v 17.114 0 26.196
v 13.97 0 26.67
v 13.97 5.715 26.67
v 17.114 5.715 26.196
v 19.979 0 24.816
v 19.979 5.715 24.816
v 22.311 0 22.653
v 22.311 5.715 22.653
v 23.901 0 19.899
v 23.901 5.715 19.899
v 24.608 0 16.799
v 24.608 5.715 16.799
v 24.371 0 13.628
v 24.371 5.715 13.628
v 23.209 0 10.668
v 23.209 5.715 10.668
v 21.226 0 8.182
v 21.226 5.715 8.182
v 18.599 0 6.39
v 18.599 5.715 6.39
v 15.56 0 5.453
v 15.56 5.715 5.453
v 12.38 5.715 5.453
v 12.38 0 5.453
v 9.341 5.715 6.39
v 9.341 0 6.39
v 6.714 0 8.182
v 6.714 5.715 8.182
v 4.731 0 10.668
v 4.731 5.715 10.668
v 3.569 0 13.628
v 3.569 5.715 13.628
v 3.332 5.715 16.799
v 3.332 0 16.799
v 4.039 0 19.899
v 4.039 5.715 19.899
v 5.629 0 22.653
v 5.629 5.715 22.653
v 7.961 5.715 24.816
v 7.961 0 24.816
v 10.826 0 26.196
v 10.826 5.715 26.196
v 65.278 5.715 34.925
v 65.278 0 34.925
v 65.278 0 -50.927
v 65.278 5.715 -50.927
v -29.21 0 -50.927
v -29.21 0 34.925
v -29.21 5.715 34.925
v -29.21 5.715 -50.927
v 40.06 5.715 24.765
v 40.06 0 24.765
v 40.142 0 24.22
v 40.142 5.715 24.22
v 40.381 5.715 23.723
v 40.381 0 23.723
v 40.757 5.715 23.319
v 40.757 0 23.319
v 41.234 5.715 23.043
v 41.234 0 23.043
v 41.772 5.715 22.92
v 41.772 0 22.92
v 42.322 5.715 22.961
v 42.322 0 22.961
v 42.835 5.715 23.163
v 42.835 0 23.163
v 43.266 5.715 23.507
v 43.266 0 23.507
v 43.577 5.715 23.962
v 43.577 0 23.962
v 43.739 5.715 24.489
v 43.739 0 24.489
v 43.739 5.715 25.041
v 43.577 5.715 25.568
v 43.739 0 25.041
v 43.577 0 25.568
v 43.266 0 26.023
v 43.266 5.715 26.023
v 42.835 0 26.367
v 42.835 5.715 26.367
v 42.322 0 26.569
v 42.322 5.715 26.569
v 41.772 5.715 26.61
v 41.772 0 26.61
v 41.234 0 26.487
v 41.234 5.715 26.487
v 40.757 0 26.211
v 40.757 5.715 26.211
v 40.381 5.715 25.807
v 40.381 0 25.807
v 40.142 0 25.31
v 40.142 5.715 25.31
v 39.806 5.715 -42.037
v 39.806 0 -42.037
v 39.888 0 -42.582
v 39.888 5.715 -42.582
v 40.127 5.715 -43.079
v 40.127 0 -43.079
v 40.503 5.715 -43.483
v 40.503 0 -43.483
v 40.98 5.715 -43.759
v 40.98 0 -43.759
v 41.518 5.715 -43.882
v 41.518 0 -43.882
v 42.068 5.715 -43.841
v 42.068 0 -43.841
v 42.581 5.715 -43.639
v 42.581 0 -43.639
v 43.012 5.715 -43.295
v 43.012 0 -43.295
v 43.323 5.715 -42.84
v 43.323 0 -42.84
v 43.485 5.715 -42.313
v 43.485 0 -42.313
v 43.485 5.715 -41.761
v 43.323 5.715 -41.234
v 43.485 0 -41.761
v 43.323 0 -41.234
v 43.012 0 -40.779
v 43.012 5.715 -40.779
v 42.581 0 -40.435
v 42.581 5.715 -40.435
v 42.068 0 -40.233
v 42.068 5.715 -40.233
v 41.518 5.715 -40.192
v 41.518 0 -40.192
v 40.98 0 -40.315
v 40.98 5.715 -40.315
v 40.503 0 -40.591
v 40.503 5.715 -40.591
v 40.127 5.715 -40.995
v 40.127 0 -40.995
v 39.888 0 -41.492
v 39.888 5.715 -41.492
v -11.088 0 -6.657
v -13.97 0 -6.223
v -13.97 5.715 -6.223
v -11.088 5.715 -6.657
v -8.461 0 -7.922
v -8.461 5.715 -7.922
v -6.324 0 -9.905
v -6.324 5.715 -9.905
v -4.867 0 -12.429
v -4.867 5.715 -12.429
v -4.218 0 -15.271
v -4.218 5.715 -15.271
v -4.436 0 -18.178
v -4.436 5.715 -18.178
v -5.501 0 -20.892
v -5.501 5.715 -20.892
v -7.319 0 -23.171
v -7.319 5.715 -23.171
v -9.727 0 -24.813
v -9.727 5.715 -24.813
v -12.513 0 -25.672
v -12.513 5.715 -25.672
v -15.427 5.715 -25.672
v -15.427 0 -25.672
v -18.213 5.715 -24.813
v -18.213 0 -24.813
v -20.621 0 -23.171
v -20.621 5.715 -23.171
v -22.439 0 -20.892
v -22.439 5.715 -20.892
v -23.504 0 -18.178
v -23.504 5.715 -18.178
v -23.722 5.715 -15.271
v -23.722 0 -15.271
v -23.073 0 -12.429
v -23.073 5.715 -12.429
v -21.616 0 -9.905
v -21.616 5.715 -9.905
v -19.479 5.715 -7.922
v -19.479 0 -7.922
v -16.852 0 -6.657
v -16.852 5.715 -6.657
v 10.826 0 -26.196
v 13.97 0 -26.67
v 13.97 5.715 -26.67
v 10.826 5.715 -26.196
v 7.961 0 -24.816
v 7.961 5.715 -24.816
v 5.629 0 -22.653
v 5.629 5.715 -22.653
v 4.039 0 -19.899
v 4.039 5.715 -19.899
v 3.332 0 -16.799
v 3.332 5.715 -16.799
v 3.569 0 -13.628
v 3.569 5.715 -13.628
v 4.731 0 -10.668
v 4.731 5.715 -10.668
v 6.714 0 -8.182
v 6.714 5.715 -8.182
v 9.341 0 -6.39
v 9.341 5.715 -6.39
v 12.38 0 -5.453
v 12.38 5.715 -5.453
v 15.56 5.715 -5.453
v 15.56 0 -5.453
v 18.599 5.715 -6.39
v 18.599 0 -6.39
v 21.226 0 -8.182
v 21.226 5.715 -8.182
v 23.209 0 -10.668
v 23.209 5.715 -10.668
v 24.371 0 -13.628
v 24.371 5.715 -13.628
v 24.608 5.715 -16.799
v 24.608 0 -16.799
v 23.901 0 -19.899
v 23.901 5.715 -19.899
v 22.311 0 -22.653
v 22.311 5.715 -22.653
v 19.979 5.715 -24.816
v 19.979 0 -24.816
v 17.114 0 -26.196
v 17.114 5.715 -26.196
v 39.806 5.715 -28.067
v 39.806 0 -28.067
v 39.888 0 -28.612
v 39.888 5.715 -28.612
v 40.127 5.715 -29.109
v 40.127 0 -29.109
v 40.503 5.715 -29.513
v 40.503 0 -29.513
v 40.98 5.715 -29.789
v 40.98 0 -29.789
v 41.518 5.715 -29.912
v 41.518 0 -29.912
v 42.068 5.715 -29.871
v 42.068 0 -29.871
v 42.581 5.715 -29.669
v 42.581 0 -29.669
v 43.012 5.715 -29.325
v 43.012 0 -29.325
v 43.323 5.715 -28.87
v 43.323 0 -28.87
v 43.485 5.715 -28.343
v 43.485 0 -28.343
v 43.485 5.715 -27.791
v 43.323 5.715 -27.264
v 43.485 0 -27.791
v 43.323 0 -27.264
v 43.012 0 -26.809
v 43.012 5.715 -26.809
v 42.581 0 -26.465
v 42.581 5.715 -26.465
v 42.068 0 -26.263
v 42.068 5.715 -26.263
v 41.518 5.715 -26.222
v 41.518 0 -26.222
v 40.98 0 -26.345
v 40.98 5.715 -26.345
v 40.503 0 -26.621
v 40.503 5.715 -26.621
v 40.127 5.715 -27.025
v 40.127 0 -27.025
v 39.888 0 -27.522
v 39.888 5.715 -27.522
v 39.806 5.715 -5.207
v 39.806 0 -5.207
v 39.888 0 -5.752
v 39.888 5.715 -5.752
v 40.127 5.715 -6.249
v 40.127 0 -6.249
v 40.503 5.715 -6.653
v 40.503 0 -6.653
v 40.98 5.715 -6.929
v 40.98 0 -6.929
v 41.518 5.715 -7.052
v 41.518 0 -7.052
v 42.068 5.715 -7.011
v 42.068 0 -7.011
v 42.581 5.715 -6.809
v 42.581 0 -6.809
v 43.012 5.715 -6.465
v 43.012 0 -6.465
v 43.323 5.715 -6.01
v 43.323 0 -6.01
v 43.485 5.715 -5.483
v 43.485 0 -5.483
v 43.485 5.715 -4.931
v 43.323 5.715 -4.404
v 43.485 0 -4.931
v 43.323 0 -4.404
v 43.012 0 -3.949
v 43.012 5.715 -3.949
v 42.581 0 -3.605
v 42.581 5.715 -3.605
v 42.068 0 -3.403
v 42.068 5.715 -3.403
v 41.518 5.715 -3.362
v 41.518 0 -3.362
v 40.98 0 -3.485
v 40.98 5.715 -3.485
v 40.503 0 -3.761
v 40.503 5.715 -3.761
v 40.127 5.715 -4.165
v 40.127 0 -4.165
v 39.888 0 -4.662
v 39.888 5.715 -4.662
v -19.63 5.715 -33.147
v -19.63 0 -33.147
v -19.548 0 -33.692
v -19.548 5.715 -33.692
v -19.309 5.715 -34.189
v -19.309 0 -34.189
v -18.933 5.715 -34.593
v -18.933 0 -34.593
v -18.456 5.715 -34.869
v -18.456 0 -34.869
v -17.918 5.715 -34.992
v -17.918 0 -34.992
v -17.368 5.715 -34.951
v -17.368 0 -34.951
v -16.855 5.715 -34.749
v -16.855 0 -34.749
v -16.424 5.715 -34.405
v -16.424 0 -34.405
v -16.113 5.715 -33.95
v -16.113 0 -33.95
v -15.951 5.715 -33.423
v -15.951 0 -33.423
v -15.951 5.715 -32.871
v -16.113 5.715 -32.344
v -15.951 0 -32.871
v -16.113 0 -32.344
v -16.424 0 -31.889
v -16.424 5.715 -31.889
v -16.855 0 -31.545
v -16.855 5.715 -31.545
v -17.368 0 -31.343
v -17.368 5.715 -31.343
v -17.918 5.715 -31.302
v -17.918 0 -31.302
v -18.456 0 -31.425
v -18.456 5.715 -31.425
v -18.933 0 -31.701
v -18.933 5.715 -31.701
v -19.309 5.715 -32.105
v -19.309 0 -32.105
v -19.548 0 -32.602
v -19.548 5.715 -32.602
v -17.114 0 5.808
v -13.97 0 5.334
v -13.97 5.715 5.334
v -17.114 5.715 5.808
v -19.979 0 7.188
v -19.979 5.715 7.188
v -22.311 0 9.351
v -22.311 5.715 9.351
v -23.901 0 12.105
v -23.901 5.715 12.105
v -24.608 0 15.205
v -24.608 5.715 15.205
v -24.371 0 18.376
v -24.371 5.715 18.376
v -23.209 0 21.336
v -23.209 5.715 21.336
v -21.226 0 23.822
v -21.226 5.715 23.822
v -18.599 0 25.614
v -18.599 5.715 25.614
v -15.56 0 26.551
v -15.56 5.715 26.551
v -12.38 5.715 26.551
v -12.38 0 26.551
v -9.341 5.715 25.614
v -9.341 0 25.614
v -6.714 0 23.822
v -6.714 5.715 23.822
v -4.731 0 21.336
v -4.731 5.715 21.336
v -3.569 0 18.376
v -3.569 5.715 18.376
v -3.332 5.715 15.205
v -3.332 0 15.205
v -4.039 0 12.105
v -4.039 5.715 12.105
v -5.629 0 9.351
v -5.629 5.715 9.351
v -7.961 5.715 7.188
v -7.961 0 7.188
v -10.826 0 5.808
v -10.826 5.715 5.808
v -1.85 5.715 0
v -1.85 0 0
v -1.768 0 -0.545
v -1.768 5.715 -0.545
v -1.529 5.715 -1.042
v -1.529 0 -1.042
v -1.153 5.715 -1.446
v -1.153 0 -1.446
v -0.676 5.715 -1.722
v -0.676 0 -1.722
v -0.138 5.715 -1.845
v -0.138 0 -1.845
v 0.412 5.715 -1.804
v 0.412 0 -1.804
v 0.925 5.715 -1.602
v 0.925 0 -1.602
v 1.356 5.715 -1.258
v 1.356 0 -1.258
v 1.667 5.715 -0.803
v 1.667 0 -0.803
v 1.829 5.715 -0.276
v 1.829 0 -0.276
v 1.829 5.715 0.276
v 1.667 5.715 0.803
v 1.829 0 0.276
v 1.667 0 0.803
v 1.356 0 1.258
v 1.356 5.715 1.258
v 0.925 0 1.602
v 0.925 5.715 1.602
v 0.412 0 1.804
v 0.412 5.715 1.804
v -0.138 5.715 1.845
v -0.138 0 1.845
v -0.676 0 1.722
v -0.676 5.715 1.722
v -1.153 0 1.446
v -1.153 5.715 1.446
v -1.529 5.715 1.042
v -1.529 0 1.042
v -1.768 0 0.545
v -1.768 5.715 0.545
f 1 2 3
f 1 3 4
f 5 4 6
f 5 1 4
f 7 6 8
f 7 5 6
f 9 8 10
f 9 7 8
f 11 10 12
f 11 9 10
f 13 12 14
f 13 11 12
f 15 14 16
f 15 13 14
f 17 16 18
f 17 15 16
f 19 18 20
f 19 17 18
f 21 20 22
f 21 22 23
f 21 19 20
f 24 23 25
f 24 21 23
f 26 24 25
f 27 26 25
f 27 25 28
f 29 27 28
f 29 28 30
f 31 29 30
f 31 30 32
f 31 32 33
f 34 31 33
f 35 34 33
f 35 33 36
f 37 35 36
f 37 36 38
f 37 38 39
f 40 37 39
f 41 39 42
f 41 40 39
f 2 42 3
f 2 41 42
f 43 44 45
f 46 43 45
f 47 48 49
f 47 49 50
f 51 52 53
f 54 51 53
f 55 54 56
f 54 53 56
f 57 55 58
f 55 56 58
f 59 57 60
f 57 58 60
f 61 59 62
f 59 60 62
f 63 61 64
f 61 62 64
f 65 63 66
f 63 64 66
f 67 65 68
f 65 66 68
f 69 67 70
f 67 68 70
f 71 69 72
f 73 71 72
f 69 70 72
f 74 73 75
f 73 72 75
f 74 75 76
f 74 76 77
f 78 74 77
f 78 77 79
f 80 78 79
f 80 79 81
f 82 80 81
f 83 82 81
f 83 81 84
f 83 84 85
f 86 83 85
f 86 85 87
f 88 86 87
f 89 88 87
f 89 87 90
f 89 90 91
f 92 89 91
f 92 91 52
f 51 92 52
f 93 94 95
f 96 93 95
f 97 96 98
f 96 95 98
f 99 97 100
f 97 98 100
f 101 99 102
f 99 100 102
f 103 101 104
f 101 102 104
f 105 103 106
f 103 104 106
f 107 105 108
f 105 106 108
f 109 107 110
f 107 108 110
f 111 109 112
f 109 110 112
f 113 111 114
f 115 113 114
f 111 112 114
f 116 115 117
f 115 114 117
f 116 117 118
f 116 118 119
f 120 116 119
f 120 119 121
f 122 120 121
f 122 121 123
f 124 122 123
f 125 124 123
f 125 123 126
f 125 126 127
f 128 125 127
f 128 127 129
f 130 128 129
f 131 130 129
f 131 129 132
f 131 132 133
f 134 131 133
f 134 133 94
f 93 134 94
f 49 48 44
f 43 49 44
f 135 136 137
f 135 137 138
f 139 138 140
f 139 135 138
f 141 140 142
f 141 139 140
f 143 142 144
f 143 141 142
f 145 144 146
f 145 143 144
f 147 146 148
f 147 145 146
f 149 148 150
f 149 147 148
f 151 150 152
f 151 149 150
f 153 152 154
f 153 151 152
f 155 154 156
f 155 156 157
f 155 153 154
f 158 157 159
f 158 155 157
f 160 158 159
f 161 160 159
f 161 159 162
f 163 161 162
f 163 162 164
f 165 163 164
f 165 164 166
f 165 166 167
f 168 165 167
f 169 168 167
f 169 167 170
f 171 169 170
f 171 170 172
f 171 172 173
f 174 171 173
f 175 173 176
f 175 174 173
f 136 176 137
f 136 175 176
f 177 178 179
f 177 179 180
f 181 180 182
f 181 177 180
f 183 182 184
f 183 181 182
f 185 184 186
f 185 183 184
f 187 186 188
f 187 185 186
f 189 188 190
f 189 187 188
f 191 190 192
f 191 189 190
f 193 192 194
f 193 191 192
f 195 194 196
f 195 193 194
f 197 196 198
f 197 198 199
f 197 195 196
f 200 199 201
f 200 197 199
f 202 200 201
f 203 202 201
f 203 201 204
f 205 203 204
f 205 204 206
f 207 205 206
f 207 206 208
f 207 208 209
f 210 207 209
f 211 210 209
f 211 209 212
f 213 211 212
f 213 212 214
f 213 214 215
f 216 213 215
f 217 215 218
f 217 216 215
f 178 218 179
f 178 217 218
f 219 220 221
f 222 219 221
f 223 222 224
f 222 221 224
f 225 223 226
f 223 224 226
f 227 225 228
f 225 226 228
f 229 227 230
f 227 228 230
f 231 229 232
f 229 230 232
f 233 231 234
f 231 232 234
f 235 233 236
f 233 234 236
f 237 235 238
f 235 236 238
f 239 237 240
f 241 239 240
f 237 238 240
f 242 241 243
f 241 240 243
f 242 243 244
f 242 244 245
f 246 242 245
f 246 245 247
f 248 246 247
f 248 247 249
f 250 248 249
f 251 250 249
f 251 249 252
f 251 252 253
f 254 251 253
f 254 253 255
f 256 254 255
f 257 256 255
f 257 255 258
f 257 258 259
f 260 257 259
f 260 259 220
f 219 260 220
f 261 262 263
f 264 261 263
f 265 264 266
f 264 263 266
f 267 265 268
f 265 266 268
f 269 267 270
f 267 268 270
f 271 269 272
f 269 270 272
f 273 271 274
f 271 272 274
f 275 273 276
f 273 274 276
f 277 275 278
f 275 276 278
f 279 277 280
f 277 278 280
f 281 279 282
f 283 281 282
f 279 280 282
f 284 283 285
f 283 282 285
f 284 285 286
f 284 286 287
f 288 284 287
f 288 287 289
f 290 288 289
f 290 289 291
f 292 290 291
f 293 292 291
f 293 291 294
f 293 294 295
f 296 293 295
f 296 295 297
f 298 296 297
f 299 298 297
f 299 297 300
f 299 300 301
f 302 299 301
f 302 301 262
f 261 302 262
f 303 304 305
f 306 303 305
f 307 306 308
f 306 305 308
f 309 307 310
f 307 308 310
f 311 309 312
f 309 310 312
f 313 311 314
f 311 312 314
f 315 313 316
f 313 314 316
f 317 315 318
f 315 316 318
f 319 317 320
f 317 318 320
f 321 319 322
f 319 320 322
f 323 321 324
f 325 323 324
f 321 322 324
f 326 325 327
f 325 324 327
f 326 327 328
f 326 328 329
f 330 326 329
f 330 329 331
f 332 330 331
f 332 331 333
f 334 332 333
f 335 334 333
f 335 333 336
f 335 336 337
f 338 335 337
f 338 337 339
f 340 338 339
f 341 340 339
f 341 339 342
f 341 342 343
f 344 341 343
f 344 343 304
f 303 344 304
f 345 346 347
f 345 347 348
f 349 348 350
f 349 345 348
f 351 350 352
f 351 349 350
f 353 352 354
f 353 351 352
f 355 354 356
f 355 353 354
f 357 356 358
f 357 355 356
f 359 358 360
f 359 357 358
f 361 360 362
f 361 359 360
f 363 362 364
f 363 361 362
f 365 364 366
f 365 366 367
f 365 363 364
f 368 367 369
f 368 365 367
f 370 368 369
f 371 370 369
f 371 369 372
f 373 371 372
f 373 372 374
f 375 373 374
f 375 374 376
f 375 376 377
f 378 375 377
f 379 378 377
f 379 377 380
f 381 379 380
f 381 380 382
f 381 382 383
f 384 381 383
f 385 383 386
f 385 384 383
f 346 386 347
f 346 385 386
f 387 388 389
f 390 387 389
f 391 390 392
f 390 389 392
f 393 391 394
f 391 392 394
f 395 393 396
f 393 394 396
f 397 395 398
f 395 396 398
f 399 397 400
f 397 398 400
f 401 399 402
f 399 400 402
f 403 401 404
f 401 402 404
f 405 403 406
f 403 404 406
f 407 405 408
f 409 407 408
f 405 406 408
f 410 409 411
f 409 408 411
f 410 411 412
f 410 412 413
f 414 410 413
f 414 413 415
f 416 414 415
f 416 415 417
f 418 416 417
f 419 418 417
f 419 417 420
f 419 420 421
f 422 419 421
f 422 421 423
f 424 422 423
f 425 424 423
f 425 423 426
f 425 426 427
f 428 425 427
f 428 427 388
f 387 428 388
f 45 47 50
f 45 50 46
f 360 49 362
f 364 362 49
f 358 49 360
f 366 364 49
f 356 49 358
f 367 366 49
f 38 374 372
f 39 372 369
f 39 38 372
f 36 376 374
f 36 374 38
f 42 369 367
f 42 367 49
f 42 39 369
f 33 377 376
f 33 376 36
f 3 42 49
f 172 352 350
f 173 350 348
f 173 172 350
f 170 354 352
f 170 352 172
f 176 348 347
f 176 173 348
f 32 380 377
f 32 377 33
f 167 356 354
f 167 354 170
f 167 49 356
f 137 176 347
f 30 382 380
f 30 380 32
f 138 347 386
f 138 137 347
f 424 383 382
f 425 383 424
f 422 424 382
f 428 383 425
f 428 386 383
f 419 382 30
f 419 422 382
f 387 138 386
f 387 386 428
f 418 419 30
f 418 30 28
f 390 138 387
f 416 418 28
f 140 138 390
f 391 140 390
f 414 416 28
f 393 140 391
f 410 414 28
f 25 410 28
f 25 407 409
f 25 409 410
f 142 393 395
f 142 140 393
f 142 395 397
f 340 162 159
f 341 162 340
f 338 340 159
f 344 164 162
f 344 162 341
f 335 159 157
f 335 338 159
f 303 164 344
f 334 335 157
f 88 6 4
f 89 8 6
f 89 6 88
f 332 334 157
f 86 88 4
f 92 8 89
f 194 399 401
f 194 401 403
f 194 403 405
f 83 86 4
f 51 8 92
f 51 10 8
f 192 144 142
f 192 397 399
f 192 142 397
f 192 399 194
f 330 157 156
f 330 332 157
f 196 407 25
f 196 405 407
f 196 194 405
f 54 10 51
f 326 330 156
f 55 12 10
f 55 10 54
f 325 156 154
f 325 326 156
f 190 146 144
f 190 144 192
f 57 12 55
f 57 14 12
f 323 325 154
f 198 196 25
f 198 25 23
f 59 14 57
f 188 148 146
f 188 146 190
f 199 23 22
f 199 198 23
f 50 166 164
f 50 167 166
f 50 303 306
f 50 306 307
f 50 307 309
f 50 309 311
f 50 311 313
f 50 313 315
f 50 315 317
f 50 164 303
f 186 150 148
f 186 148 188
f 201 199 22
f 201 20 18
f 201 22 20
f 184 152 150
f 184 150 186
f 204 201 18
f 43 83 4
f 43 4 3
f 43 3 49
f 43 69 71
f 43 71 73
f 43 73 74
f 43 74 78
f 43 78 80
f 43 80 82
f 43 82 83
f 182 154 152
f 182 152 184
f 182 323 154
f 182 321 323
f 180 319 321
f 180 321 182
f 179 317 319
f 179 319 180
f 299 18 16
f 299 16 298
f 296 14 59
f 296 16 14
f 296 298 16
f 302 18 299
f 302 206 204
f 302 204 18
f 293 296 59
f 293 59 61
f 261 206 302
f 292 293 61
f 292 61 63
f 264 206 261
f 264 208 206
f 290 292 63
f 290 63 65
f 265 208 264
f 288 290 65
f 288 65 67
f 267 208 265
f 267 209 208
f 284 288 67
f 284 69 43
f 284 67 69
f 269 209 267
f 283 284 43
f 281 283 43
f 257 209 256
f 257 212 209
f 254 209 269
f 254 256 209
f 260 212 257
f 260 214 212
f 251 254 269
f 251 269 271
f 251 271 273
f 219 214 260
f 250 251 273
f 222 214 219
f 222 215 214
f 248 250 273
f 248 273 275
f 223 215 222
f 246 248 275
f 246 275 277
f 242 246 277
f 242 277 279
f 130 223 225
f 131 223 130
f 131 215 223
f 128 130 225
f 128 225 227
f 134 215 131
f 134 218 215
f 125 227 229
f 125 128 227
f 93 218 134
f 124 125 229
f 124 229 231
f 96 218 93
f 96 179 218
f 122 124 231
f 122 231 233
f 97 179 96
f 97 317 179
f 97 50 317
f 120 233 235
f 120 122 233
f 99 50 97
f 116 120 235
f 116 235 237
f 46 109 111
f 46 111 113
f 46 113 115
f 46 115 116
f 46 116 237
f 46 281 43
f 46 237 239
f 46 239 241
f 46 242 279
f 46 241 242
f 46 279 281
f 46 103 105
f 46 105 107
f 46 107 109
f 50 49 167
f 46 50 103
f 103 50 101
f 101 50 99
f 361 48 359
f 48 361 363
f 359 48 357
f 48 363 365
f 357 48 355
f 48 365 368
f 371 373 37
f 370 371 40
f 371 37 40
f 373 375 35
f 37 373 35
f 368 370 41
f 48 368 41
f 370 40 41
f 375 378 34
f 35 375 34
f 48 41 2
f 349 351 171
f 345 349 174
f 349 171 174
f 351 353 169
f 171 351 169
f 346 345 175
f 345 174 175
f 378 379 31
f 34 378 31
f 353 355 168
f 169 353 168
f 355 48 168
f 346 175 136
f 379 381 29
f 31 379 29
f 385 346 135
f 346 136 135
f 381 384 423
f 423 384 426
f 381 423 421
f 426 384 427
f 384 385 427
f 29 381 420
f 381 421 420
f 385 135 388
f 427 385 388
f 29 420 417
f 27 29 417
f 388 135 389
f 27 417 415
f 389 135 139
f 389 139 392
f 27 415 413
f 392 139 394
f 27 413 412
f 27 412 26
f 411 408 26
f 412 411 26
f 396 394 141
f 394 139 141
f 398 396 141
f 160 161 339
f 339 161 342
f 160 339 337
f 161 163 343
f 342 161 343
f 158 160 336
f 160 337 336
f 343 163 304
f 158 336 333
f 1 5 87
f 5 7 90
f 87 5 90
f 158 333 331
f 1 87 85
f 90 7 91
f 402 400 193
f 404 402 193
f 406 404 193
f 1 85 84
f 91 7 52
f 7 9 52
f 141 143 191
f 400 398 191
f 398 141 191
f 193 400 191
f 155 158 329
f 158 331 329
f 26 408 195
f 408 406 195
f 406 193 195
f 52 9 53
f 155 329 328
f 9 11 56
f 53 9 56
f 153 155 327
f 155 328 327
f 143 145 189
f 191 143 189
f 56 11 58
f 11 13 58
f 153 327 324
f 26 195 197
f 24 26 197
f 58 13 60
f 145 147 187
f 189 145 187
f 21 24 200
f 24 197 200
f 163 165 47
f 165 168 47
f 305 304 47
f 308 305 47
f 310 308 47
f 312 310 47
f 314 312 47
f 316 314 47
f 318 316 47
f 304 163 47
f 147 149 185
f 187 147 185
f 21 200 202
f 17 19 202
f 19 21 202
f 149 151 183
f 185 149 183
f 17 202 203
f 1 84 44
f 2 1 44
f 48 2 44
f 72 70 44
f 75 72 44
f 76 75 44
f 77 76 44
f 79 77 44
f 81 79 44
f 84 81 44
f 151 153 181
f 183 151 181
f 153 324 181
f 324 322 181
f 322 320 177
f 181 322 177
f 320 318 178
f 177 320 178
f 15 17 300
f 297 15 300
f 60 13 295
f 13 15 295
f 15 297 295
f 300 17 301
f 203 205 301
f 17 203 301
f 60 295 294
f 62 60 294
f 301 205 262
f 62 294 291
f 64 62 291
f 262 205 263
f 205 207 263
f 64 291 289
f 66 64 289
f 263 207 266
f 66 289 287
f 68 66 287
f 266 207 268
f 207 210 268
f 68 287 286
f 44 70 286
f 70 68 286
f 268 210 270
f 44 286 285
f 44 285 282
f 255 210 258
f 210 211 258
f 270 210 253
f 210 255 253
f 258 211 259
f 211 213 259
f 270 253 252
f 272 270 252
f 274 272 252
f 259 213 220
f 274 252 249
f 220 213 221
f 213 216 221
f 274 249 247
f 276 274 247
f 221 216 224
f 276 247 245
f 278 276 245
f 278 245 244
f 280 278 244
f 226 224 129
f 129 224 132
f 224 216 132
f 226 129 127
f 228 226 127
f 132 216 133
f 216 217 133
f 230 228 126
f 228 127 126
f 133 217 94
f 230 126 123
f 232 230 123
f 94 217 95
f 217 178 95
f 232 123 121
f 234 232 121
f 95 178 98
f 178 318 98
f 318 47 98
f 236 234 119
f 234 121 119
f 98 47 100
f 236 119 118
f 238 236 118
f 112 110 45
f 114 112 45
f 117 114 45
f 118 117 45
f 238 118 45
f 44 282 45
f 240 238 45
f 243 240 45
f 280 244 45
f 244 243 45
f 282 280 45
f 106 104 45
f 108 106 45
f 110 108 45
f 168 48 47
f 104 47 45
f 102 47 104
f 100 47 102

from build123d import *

# Parameters (mm, degrees)
SKETCH1_W                = 94.488
SKETCH1_H                = 85.852
SKETCH1_R                = 9.779
SKETCH1_R_2              = 10.668
BOSS_EXTRUDE1_DEPTH      = 5.715
M3_CLEARANCE_HOLE1_D     = 3.7
M3_CLEARANCE_HOLE1_DEPTH = 25.4
M3_CLEARANCE_HOLE1_TIP   = 1.111592145


with BuildPart() as part:
    # Sketch1 → Boss-Extrude1 (new body)
    with BuildSketch(Plane(origin=(0, 0, 0), x_dir=(1, 0, 0), z_dir=(0, 1, 0))):
        with Locations((18.034, 8.001)):
            Rectangle(SKETCH1_W, SKETCH1_H)
        with Locations(Location((-13.97, 16.002, 0), (0, 0, 270))):
            Circle(SKETCH1_R, mode=Mode.SUBTRACT)
        with Locations(Location((13.97, 16.002, 0), (0, 0, 90))):
            Circle(SKETCH1_R_2, mode=Mode.SUBTRACT)
        with Locations(Location((13.97, -16.002, 0), (0, 0, 270))):
            Circle(SKETCH1_R_2, mode=Mode.SUBTRACT)
        with Locations(Location((-13.97, -16.002, 0), (0, 0, 90))):
            Circle(SKETCH1_R_2, mode=Mode.SUBTRACT)
    extrude(amount=BOSS_EXTRUDE1_DEPTH)

    # M3 Clearance Hole1
    with Locations(Plane(origin=(0, 5.715, 0), x_dir=(1, 0, 0), z_dir=(0, 1, 0))):
        with Locations((41.656, 42.037), (41.91, -24.765), (-17.78, 33.147), (41.656, 5.207), (41.656, 28.067), (0, 0)):
            Hole(M3_CLEARANCE_HOLE1_D / 2, depth=M3_CLEARANCE_HOLE1_DEPTH)
            with Locations((0, 0, -(M3_CLEARANCE_HOLE1_DEPTH + M3_CLEARANCE_HOLE1_TIP / 2))):  # 118° drill point
                Cone(0, M3_CLEARANCE_HOLE1_D / 2, M3_CLEARANCE_HOLE1_TIP, mode=Mode.SUBTRACT)


solid = part.part
